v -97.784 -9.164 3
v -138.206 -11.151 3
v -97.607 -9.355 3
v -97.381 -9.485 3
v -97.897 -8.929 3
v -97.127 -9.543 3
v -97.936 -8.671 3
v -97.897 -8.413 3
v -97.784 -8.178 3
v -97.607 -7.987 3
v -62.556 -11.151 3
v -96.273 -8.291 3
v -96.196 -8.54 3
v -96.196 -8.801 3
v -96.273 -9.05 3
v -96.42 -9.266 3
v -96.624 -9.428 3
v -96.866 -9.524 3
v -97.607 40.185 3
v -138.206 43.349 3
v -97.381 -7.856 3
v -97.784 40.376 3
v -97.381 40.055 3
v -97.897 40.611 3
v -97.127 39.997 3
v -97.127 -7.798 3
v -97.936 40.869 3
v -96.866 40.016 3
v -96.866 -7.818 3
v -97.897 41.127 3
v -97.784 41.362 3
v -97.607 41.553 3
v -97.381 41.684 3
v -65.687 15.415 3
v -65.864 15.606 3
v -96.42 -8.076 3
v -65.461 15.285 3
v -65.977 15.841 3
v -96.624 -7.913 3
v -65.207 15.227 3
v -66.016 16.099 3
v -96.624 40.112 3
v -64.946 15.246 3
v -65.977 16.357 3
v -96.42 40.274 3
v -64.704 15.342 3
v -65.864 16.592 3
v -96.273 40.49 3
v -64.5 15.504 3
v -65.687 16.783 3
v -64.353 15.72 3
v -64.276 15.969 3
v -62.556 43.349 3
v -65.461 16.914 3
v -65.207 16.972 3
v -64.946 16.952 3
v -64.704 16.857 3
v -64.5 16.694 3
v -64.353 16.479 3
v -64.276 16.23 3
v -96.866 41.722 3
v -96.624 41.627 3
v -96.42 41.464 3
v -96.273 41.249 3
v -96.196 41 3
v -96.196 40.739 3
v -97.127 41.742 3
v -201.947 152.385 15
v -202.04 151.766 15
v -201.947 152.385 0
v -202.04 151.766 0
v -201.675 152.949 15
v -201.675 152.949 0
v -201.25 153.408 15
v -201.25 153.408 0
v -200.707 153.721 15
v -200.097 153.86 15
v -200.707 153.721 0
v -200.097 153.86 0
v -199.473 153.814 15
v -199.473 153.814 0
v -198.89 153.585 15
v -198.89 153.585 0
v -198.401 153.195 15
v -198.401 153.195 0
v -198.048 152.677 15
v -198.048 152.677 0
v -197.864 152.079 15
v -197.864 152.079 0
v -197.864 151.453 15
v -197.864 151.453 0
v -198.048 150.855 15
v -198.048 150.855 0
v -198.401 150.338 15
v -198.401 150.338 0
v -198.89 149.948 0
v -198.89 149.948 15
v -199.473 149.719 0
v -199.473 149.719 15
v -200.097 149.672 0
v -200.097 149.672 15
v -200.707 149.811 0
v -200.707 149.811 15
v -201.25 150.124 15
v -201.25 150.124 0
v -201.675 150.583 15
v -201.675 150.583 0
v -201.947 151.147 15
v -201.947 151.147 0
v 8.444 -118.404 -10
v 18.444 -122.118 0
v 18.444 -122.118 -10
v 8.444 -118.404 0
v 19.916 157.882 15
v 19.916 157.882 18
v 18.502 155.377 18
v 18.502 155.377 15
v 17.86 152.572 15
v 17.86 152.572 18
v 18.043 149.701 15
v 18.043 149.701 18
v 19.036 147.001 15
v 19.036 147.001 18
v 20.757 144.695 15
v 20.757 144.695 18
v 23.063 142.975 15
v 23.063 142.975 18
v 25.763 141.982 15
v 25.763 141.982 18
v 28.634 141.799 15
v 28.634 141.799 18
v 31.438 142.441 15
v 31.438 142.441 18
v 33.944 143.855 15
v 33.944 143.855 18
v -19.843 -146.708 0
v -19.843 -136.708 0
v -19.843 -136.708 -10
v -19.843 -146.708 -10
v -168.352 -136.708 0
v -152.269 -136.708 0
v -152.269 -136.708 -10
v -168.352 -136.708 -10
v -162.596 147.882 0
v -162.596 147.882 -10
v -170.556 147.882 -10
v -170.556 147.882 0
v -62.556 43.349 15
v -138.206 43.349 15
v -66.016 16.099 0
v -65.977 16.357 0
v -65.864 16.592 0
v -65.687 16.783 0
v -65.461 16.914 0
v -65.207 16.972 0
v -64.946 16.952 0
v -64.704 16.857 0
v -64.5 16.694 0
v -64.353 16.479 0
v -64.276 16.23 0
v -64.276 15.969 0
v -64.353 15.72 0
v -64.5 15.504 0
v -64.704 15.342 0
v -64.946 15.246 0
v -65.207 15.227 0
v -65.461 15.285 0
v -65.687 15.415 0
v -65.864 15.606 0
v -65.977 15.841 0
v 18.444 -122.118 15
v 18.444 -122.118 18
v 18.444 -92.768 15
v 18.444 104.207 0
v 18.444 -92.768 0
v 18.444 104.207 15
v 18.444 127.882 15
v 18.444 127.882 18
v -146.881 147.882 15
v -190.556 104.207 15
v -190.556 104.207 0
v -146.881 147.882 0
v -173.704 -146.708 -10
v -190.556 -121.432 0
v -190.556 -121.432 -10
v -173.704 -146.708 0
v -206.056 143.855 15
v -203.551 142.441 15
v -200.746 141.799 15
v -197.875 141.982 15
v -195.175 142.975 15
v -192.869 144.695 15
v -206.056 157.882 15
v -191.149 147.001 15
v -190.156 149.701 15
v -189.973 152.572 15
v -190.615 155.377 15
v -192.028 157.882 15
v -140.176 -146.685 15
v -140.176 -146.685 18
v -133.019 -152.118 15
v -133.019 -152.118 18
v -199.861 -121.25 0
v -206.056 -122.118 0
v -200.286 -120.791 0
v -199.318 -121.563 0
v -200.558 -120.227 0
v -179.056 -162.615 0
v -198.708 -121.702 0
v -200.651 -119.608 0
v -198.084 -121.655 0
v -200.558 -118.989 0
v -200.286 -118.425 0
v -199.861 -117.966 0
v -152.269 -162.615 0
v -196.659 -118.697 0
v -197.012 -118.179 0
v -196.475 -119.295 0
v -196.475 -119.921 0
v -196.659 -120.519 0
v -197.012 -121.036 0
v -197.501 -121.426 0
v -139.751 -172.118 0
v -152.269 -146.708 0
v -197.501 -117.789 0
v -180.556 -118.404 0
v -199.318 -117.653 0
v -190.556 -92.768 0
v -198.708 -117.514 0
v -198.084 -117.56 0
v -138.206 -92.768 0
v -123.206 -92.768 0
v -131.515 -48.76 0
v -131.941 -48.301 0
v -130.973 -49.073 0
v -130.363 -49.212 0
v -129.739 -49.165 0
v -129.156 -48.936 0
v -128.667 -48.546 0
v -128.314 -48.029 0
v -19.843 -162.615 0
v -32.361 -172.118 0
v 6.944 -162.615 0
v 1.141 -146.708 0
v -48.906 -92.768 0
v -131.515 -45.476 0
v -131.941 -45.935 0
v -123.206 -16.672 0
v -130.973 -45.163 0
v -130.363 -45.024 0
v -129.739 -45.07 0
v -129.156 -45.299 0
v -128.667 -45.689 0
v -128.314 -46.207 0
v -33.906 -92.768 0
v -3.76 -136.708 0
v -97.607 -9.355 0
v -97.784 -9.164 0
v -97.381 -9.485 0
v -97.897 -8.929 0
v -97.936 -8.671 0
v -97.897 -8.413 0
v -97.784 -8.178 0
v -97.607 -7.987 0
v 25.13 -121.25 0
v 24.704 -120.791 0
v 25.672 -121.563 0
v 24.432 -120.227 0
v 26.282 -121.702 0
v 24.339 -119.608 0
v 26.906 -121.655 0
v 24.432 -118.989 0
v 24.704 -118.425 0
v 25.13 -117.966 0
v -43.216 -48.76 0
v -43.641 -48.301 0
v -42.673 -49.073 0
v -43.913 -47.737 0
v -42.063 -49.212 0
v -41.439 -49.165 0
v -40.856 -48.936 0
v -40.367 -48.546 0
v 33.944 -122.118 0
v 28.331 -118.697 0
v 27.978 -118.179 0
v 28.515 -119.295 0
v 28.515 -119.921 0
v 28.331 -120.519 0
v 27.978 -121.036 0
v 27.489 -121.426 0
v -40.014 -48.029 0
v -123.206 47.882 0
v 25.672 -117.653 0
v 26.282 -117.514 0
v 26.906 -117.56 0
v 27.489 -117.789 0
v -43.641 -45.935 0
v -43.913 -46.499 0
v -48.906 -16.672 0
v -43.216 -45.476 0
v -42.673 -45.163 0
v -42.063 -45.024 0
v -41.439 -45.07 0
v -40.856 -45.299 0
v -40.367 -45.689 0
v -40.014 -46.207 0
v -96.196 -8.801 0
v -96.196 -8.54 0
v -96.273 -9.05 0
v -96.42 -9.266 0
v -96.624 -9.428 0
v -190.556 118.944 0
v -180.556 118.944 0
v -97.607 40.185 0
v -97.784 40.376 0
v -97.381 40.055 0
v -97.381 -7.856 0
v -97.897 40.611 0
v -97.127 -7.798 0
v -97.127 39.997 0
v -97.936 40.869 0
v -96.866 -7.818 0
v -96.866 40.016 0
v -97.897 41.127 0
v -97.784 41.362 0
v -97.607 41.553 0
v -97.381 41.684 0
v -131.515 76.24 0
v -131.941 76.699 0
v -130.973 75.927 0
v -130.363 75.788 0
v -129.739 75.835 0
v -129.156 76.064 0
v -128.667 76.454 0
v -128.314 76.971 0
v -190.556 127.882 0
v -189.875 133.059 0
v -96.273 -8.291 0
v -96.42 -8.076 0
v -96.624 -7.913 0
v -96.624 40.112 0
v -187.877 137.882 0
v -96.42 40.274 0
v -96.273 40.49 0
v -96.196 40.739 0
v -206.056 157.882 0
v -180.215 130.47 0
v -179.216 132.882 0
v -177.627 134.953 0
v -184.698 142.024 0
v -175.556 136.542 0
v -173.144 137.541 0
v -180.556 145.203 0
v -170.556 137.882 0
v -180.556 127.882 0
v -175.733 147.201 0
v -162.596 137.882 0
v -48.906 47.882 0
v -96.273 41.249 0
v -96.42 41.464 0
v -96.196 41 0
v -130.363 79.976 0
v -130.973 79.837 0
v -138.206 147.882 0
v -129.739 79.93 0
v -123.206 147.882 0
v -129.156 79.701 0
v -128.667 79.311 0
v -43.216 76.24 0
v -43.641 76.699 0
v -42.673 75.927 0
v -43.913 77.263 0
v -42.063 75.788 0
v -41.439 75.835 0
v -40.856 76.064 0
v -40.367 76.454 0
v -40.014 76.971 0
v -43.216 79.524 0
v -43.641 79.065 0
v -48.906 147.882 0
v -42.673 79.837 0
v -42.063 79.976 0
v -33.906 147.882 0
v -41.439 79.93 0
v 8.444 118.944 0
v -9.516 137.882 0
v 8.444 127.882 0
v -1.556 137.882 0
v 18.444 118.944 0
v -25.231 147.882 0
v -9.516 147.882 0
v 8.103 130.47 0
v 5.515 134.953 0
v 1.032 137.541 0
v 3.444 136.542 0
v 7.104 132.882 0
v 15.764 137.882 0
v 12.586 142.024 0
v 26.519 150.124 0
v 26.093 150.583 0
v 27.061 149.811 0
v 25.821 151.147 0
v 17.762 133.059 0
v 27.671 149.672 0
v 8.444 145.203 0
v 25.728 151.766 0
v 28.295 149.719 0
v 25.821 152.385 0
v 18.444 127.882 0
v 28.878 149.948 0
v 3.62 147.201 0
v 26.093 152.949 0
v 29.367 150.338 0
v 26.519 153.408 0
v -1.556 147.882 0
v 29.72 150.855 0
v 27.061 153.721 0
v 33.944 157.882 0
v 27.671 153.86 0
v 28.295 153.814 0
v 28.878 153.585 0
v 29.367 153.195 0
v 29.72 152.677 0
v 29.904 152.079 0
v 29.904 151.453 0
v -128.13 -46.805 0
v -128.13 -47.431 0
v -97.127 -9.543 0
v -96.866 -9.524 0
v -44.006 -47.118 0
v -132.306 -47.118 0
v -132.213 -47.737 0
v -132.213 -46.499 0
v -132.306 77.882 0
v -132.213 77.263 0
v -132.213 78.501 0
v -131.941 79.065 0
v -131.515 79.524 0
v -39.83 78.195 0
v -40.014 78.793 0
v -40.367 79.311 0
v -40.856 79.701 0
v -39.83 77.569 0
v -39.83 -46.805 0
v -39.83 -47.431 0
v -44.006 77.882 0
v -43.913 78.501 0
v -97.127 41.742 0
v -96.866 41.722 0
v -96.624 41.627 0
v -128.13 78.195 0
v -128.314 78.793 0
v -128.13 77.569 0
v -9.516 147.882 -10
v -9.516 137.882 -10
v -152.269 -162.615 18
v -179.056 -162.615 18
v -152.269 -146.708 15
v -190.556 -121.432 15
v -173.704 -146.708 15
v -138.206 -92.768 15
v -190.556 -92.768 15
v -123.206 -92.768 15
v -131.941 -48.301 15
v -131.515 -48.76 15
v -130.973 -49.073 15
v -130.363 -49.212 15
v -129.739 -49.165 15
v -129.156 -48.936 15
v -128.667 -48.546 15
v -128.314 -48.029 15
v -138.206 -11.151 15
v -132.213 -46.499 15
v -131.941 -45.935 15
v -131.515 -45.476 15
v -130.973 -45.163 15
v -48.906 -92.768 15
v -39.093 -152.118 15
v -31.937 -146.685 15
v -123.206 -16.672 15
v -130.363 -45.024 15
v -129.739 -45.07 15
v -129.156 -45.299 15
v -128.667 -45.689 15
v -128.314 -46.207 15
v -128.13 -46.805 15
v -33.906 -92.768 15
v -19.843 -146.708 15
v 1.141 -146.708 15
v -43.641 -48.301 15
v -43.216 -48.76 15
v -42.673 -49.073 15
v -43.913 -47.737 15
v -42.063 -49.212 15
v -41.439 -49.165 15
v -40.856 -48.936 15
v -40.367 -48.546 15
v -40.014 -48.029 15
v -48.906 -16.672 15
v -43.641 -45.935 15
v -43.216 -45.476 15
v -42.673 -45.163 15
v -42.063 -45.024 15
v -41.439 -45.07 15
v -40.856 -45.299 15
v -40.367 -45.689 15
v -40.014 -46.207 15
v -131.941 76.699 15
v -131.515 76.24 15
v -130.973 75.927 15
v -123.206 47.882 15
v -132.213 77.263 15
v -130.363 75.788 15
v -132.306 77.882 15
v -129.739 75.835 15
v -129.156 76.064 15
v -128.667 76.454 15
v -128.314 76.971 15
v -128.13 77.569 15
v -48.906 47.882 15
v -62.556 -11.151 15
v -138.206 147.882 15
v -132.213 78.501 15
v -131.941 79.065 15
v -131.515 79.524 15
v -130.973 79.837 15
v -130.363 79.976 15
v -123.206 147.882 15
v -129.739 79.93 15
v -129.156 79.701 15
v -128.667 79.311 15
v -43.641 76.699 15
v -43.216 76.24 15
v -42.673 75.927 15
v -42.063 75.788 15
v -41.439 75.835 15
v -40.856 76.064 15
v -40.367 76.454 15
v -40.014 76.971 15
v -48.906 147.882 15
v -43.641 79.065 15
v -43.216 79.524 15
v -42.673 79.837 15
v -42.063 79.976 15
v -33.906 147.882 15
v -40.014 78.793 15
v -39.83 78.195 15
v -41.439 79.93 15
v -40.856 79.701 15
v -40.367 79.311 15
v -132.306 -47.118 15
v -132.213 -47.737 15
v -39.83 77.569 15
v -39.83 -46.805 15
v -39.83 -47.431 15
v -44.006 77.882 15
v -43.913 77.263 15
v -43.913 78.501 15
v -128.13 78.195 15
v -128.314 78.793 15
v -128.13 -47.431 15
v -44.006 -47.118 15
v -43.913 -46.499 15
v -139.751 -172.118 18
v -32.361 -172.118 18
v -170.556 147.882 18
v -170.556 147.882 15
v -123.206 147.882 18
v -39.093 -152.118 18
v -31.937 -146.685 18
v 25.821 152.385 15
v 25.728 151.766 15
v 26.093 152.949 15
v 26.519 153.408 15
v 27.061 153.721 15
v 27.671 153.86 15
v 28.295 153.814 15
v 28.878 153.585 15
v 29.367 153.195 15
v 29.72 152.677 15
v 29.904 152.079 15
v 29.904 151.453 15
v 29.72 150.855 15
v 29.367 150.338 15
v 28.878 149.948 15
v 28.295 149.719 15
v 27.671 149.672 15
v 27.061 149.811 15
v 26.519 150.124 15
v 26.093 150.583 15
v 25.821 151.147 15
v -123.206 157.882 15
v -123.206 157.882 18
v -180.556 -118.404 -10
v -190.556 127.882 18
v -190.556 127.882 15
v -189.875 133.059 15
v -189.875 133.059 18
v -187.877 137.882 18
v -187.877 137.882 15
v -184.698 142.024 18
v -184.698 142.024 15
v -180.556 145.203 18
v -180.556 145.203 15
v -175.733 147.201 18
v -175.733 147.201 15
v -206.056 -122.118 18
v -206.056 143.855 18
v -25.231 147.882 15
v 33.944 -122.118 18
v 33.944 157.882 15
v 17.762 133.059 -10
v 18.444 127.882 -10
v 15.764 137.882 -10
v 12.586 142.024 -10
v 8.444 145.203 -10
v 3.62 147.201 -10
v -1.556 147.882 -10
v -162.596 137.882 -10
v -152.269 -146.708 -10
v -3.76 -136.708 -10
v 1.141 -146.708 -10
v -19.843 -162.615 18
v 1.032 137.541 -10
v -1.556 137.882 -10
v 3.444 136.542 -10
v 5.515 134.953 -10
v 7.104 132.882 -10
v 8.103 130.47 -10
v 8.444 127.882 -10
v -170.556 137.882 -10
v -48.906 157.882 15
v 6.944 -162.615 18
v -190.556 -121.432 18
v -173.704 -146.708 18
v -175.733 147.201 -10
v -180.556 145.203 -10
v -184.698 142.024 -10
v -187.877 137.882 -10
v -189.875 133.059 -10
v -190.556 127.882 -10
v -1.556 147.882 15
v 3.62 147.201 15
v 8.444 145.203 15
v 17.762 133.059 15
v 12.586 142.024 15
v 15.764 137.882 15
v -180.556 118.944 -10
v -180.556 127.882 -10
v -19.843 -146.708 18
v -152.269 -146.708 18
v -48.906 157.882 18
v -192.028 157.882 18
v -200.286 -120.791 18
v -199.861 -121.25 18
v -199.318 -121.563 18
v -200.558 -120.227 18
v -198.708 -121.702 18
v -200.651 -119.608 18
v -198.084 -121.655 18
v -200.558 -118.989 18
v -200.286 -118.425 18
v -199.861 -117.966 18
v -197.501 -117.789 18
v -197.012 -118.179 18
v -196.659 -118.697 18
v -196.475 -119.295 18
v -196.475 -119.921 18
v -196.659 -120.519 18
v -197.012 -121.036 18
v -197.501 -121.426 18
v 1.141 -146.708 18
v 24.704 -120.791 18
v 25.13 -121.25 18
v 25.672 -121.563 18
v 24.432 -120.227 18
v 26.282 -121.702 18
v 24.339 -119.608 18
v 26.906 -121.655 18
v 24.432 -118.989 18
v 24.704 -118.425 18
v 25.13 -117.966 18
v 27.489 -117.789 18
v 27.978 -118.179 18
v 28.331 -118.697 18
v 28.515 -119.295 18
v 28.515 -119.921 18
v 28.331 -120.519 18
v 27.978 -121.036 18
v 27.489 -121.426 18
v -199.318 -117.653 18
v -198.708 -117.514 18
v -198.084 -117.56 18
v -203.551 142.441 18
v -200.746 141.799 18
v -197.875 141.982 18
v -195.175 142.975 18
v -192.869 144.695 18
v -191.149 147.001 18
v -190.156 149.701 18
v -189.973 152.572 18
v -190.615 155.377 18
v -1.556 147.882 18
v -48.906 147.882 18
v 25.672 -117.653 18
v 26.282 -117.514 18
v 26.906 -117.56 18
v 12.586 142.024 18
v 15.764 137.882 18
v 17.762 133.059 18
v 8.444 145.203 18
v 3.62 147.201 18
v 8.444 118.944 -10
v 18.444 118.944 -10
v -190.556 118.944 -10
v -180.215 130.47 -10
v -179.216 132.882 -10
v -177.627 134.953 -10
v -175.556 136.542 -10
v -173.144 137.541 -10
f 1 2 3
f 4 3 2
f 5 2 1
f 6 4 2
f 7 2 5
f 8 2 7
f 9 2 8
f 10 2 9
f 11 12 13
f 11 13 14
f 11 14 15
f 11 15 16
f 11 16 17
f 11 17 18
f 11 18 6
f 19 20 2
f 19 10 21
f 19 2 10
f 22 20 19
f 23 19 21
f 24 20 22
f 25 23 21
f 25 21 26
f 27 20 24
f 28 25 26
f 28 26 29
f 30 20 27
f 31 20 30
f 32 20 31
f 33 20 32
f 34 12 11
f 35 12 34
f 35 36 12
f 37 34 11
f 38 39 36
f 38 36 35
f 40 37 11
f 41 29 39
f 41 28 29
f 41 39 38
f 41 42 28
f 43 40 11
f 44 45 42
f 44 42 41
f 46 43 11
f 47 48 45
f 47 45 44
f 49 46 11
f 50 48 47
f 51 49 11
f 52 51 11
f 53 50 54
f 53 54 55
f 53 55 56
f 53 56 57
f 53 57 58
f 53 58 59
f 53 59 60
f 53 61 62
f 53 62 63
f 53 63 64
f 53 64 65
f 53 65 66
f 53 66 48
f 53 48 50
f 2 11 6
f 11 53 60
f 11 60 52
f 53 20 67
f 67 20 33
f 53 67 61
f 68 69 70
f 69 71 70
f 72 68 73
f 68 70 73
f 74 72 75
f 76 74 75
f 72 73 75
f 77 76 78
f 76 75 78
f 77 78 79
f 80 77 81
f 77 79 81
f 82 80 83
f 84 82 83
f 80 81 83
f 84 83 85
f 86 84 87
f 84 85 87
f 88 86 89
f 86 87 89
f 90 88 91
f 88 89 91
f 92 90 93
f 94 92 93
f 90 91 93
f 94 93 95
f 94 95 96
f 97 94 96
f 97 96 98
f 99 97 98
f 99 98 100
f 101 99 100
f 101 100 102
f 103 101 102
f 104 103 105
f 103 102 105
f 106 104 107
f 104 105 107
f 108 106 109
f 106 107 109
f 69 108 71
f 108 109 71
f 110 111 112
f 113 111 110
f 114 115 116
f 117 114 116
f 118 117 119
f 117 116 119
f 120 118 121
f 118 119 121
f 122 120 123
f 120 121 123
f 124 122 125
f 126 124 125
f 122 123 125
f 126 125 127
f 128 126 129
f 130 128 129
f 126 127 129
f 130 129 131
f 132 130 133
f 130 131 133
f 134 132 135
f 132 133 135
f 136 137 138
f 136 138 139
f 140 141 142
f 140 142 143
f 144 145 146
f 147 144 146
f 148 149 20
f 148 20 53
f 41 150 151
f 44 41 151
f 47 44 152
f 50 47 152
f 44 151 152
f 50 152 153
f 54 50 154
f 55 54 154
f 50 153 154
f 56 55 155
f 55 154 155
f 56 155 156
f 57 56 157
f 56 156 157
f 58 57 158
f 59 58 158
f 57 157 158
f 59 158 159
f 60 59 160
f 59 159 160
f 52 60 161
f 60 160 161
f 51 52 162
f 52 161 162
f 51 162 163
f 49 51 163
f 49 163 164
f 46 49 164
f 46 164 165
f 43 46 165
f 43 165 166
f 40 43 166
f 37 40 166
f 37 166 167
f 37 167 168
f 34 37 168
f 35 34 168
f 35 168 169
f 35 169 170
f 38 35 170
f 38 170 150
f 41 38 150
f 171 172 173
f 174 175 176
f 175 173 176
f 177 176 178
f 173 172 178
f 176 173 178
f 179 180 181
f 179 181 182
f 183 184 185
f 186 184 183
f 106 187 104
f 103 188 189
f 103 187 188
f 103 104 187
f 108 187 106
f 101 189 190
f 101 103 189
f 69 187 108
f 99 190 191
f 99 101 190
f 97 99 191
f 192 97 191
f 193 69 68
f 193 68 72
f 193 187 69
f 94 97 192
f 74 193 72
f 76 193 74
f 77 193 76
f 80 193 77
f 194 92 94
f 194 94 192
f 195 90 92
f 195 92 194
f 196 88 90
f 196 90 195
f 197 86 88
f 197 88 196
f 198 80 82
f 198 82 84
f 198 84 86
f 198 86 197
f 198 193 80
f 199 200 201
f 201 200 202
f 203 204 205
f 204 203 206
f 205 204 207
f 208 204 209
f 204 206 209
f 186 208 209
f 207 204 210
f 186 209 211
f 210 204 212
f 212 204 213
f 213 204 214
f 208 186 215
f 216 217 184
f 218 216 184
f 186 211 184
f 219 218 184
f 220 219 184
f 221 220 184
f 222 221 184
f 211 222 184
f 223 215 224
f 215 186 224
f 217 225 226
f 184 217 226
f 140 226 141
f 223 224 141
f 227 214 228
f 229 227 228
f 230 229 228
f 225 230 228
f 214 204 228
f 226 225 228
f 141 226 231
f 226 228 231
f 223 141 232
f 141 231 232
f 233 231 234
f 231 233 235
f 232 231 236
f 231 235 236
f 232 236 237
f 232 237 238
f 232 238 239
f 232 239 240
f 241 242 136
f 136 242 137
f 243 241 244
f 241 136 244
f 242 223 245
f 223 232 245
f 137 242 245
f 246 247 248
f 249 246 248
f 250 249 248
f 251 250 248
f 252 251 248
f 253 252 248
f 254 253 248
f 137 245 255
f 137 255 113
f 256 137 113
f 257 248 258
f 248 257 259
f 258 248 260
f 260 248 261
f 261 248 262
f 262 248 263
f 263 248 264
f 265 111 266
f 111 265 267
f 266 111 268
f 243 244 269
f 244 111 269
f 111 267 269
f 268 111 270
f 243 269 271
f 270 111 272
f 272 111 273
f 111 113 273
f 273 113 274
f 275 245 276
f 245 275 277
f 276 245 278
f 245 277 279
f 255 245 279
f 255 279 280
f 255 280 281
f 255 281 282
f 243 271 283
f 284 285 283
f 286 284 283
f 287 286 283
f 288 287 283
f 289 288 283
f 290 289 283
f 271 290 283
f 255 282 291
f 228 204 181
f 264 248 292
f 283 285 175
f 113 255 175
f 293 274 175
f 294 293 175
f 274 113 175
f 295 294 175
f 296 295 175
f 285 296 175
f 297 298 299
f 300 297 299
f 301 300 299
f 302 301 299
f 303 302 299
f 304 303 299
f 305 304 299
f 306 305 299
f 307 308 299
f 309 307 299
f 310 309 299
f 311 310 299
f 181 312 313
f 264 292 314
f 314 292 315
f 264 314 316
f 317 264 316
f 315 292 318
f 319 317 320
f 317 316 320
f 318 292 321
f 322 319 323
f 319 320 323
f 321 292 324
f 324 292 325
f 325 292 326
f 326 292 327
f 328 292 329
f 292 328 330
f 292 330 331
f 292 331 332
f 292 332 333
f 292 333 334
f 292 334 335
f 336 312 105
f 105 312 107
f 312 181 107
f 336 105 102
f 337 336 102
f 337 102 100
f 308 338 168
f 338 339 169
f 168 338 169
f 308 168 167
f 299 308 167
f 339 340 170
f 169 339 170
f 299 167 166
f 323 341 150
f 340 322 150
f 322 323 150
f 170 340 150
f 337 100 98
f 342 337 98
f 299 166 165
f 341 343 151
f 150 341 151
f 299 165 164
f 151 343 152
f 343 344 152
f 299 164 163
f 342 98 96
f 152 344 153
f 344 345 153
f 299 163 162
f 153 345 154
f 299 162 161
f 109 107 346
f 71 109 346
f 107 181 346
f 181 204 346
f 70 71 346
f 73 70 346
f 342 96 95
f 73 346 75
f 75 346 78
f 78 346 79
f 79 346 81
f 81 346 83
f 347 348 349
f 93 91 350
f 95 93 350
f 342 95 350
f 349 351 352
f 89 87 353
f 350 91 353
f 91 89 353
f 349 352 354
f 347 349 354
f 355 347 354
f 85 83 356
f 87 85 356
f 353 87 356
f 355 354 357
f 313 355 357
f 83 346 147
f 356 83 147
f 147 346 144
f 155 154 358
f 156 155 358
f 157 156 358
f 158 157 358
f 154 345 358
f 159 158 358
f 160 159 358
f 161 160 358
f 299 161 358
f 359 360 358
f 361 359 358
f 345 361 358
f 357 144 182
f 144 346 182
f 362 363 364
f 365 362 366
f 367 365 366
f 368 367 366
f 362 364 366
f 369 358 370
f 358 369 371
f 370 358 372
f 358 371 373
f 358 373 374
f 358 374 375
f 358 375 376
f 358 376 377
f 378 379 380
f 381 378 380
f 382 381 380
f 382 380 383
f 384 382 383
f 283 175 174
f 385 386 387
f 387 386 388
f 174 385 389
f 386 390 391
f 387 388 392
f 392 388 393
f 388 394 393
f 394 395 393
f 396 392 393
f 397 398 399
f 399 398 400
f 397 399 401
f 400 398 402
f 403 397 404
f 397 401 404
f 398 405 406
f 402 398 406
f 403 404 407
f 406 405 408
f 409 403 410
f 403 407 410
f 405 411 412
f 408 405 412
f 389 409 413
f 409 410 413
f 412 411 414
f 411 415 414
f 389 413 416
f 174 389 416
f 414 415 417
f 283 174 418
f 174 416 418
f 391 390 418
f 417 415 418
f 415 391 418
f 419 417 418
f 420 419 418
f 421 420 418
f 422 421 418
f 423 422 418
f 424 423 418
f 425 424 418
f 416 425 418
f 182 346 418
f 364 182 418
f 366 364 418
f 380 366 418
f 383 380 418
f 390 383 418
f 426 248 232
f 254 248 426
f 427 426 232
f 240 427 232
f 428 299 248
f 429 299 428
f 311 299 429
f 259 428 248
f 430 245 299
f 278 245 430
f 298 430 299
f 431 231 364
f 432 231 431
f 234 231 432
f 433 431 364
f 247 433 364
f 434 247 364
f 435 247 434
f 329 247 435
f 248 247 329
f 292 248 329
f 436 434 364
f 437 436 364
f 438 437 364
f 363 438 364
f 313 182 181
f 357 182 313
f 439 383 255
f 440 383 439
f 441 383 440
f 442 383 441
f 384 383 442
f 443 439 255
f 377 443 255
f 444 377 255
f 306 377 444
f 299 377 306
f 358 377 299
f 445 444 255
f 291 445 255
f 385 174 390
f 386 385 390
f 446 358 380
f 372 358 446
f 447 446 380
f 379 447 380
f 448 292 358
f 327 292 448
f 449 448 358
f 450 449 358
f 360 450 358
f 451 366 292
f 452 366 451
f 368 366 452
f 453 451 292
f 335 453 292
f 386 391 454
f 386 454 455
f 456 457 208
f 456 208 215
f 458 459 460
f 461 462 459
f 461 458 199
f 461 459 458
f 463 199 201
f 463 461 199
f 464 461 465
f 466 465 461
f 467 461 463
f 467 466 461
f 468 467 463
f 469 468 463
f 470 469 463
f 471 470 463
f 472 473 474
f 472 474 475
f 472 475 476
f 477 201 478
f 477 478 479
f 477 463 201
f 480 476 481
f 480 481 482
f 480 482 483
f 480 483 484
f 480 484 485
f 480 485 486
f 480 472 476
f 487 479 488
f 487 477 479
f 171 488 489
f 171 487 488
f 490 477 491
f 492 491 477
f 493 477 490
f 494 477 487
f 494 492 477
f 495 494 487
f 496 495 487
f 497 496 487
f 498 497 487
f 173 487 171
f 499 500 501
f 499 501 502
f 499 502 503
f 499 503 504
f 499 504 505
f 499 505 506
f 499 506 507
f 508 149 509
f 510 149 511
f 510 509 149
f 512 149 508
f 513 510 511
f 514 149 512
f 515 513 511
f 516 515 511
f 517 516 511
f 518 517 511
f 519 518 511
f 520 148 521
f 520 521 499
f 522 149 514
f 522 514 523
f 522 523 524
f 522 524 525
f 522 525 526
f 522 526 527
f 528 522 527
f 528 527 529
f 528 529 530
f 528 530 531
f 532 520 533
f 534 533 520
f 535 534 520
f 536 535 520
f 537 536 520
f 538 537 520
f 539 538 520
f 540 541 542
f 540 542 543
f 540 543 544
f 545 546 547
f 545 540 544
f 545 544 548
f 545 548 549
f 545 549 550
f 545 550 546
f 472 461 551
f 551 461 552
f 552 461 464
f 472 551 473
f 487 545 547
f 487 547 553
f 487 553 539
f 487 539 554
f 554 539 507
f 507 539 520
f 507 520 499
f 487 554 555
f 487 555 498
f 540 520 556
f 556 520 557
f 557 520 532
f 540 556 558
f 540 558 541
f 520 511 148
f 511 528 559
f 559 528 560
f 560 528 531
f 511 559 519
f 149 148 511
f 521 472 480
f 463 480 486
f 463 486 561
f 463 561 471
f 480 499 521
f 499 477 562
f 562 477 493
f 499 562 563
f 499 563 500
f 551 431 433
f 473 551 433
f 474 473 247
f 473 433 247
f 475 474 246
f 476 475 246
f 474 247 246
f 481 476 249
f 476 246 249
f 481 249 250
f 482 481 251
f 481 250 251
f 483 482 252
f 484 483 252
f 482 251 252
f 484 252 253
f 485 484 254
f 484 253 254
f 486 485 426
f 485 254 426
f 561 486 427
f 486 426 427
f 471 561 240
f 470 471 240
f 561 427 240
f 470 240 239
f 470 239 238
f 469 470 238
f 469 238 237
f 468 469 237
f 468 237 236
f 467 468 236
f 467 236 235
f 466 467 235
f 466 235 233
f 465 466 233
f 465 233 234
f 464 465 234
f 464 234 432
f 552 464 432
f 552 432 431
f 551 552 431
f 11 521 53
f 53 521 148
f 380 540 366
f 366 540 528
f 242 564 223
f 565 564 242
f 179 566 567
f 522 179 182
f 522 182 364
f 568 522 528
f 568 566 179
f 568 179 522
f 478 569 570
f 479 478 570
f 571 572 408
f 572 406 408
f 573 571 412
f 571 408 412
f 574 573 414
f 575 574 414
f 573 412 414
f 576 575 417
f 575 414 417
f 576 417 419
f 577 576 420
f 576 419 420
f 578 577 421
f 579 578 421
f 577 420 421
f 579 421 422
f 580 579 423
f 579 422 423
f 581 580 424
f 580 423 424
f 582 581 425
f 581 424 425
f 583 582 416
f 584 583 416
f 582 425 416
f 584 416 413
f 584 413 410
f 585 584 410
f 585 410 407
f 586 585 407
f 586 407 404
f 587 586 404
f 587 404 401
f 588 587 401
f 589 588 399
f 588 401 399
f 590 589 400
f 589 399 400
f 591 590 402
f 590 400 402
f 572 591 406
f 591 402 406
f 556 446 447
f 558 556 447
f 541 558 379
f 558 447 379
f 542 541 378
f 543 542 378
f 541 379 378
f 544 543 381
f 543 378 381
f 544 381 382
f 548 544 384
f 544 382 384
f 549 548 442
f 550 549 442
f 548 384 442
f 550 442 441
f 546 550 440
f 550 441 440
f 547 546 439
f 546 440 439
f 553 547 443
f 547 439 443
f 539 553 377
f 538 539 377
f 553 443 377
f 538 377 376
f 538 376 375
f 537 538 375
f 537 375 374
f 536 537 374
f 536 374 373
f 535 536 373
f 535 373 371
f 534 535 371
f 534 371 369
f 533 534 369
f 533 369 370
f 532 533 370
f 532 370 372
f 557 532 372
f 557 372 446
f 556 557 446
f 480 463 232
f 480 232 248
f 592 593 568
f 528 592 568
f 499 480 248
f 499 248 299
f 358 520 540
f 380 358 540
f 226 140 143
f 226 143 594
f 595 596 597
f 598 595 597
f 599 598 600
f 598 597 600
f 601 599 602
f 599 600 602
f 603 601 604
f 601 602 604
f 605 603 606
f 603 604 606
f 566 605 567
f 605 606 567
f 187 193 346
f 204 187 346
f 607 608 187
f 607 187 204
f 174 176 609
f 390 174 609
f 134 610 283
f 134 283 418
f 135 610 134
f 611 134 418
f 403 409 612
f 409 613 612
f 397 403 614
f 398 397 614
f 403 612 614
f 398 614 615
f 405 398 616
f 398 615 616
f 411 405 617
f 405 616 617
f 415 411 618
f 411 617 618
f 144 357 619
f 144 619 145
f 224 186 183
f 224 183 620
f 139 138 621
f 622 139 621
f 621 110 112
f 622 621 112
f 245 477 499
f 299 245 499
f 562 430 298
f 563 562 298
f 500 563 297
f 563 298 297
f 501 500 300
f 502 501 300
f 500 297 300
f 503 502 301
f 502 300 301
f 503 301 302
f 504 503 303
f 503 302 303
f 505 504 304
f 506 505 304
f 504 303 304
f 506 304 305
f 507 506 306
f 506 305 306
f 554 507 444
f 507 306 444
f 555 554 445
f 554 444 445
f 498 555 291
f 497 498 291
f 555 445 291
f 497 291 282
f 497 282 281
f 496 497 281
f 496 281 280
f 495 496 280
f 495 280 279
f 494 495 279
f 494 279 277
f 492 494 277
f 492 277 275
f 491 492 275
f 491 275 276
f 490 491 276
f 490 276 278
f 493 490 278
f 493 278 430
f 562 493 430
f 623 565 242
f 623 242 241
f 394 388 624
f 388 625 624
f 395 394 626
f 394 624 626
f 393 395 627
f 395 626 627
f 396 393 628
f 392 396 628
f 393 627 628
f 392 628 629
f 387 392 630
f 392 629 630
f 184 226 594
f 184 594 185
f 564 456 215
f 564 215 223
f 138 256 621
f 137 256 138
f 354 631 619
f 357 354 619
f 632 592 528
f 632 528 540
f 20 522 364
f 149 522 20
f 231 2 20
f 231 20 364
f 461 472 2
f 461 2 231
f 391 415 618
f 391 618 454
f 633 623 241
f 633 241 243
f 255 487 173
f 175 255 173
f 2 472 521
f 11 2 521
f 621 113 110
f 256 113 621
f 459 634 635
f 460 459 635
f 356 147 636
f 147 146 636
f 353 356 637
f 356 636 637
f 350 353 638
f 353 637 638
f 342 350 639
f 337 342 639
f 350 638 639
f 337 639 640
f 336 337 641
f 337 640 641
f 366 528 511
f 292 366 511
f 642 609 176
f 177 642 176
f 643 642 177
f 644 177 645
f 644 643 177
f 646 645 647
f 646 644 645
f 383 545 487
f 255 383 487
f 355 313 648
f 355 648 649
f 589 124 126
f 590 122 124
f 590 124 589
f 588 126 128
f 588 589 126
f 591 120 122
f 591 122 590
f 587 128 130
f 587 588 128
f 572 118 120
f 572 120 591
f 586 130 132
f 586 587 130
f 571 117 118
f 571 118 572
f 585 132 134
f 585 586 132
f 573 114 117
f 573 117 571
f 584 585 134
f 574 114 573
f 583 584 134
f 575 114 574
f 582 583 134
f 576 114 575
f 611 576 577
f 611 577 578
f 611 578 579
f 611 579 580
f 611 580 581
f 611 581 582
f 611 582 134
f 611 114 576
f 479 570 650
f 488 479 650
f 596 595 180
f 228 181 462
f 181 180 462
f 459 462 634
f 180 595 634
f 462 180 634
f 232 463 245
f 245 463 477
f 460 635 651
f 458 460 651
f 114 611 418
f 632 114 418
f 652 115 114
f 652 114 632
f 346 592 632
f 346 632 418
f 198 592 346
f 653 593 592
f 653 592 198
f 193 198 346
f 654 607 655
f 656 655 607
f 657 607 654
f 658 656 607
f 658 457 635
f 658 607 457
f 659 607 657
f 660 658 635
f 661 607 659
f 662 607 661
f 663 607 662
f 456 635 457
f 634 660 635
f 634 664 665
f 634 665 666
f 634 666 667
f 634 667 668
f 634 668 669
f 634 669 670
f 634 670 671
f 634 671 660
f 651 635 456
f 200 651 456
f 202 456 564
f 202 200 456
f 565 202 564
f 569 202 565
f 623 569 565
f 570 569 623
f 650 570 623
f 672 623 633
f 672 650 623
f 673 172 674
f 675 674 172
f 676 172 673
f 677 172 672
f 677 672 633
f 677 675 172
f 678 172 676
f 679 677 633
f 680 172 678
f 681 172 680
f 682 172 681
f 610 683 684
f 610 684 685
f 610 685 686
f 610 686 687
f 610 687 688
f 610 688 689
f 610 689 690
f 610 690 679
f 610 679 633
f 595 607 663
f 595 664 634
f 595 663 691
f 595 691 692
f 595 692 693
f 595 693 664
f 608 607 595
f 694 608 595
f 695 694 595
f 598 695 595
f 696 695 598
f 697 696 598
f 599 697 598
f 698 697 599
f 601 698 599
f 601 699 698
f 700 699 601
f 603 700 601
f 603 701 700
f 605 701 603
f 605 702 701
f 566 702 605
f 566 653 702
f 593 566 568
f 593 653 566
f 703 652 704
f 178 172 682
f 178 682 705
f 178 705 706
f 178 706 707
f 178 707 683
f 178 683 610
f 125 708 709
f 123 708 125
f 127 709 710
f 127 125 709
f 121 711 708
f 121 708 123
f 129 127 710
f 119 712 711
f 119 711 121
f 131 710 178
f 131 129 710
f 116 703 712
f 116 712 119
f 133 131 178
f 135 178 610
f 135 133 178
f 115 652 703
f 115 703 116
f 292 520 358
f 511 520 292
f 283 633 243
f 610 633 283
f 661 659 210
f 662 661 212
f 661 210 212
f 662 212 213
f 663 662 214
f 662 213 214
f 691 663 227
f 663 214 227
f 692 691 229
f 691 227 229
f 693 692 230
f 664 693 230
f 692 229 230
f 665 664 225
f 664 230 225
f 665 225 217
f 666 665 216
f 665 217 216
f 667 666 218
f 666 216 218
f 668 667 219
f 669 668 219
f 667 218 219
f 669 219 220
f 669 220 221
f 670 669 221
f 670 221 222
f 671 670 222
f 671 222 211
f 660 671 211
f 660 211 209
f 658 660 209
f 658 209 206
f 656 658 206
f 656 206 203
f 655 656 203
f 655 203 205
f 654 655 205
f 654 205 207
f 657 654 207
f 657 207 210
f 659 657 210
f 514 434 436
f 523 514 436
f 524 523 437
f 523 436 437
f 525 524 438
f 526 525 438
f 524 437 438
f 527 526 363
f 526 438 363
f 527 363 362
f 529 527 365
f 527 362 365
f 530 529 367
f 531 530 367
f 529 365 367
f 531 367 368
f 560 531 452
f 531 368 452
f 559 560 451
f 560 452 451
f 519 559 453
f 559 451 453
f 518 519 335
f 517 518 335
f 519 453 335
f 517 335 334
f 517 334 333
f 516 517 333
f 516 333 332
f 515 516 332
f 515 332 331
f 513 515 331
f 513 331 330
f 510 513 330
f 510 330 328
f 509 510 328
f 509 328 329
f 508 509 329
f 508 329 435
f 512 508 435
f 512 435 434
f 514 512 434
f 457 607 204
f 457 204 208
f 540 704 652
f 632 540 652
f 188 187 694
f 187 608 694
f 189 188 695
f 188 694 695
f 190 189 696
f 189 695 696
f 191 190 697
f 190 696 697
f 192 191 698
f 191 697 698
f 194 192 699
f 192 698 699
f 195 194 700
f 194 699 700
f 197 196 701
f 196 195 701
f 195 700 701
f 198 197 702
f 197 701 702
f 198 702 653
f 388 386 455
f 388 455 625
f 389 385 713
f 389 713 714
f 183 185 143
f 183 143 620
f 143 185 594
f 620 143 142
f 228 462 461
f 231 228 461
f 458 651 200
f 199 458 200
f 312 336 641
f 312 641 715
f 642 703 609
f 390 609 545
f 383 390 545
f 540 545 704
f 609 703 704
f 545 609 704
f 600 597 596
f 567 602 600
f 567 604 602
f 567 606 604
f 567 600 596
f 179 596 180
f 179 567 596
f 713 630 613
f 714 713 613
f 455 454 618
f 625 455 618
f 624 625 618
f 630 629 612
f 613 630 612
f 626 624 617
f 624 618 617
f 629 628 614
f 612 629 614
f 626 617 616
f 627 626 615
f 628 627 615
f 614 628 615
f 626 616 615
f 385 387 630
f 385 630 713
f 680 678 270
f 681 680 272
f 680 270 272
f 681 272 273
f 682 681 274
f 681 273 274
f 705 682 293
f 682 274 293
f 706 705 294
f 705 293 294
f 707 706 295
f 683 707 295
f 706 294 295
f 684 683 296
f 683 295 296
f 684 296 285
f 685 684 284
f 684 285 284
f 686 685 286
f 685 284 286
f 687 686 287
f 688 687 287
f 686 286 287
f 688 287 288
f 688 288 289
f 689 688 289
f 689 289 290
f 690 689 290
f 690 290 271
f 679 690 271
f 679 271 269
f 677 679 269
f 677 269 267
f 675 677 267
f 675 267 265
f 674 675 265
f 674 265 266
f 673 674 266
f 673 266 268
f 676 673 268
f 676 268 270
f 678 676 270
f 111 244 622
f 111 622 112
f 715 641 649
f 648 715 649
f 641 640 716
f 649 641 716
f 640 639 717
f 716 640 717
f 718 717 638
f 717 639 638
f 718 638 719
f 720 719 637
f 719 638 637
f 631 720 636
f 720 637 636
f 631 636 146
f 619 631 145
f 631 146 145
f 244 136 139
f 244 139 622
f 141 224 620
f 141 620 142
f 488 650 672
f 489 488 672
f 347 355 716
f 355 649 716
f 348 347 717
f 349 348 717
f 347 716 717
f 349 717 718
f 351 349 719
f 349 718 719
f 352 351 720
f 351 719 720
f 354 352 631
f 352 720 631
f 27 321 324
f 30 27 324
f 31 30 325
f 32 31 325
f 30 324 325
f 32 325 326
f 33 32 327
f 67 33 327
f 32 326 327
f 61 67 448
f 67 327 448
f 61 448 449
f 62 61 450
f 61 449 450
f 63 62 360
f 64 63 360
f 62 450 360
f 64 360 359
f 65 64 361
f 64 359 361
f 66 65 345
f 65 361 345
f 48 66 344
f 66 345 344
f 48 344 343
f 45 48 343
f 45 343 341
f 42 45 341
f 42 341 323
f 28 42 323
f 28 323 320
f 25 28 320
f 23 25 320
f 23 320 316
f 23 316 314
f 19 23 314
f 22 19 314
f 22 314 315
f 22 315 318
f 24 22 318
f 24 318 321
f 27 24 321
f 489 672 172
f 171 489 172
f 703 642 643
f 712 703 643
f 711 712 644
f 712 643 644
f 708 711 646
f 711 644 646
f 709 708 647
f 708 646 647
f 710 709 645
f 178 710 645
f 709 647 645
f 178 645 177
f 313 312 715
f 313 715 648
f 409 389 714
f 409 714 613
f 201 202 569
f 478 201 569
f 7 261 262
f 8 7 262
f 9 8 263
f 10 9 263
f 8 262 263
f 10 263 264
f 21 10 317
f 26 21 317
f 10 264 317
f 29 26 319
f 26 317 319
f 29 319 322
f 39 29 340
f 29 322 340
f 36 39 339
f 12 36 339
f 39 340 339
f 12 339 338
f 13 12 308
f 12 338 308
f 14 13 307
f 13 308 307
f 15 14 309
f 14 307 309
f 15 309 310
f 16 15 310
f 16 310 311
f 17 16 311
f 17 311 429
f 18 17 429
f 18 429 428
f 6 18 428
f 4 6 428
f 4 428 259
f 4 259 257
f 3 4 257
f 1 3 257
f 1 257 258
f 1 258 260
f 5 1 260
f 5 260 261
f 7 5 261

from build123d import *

# Parameters (mm, degrees)
BOSS_EXTRU_1_DEPTH                                = 30
ENL_V_MAT_EXTRU_1_DEPTH                           = 15
BOSS_EXTRU_2_DEPTH                                = 10
BOSS_EXTRU_3_DEPTH                                = 10
BOSS_EXTRU_4_DEPTH                                = 10
BOSS_EXTRU_5_DEPTH                                = 10
DIAM_TRE_DU_PER_AGE_4_2_4_2_1_D                   = 4.2
DIAM_TRE_DU_PER_AGE_4_2_4_2_1_DEPTH               = 40
CHAMBRAGE_POUR_VIS_T_TE_HEXAGONALE_M3_D           = 4.2
CHAMBRAGE_POUR_VIS_T_TE_HEXAGONALE_M3_DEPTH       = 40
CHAMBRAGE_POUR_VIS_T_TE_HEXAGONALE_M3_CBORE_D     = 20
CHAMBRAGE_POUR_VIS_T_TE_HEXAGONALE_M3_CBORE_DEPTH = 15
CONG_1_R                                          = 10
CONG_2_R                                          = 20
ENL_V_MAT_EXTRU_2_DEPTH                           = 270.645454496
TROU_TARAUD_M5X0_81_D                             = 4.2
TROU_TARAUD_M5X0_81_ON_FACE_2_D                   = 4.2
BOSS_EXTRU_6_DEPTH                                = 15
ESQUISSE14_W                                      = 344.623968027
ESQUISSE14_H                                      = 364.856294917
ENL_V_MAT_EXTRU_3_DEPTH                           = 12
BOSS_EXTRU_7_DEPTH                                = 15
ESQUISSE16_W                                      = 47
ESQUISSE16_H                                      = 54.5
ENL_V_MAT_EXTRU_4_DEPTH                           = 12
ESQUISSE17_R                                      = 0.5
ENL_V_MAT_EXTRU_5_DEPTH                           = 12
TROU_TARAUD_M2_2X0_451_D                          = 1.75
ENL_V_MAT_EXTRU_6_DEPTH                           = 270.645454496
BOSS_EXTRU_8_DEPTH                                = 15
ESQUISSE21_W                                      = 34.017882368
ESQUISSE21_H                                      = 54.5
ENL_V_MAT_EXTRU_7_DEPTH                           = 12
TROU_TARAUD_M5X0_82_D                             = 4.2
TROU_TARAUD_M5X0_82_DEPTH                         = 54.927
TROU_TARAUD_M5X0_82_TIP                           = 1.2618073
TROU_TARAUD_M5X0_84_D                             = 4.2
TROU_TARAUD_M5X0_84_DEPTH                         = 54.927
TROU_TARAUD_M5X0_84_TIP                           = 1.2618073


with BuildPart() as part:
    # Esquisse1 → Boss.-Extru.1 (new body)
    with BuildSketch(Plane.XY.offset(30)):
        Polygon((33.943844834, -122.117785393), (33.943844834, 157.882214607), (-206.056155166, 157.882214607), (-206.056155166, -122.117785393), (-179.056155166, -162.614832092), (-152.268878217, -162.614832092), (-139.750990012, -172.117785393), (-32.361320321, -172.117785393), (-19.843432116, -162.614832092), (6.943844834, -162.614832092), align=None)
    extrude(amount=-BOSS_EXTRU_1_DEPTH)

    # Esquisse2 → Enlèv. mat.-Extru.1 (cut)
    with BuildSketch(Plane.XY.offset(30)):
        Polygon((-123.206083599, 157.882214607), (-123.206083599, 147.882214607), (-190.556155166, 147.882214607), (-190.556155166, -121.431981452), (-173.70399548, -146.708377667), (-152.268878217, -146.708377667), (-140.175798707, -146.685066621), (-133.019479604, -152.117785393), (-39.092830728, -152.117785393), (-31.936511626, -146.685066621), (-19.843432116, -146.708377667), (1.141061448, -146.708377667), (18.443844834, -122.117785393), (18.443844834, 147.882214607), (-48.906226734, 147.882214607), (-48.906226734, 157.882214607), align=None)
    extrude(amount=-ENL_V_MAT_EXTRU_1_DEPTH, mode=Mode.SUBTRACT)

    # Esquisse3 → Boss.-Extru.2 (add)
    with BuildSketch(Plane(origin=(0, 0, 0), x_dir=(-1, 0, 0), z_dir=(0, 0, -1))):
        Polygon((162.596079372, 137.882214607), (162.596079372, 147.882214607), (190.556155166, 147.882214607), (190.556155166, 118.944465923), (180.556155166, 118.944465923), (180.556155166, 137.882214607), align=None)
    extrude(amount=BOSS_EXTRU_2_DEPTH)

    # Esquisse4 → Boss.-Extru.3 (add)
    with BuildSketch(Plane(origin=(0, 0, 0), x_dir=(-1, 0, 0), z_dir=(0, 0, -1))):
        Polygon((152.268878217, -136.708377667), (168.352374382, -136.708377667), (180.556155166, -118.404041358), (190.556155166, -121.431981452), (173.70399548, -146.708377667), (152.268878217, -146.708377667), align=None)
    extrude(amount=BOSS_EXTRU_3_DEPTH)

    # Esquisse5 → Boss.-Extru.4 (add)
    with BuildSketch(Plane(origin=(0, 0, 0), x_dir=(-1, 0, 0), z_dir=(0, 0, -1))):
        Polygon((-8.443844834, 137.882214607), (-8.443844834, 118.944465923), (-18.443844834, 118.944465923), (-18.443844834, 147.882214607), (9.516230961, 147.882214607), (9.516230961, 137.882214607), align=None)
    extrude(amount=BOSS_EXTRU_4_DEPTH)

    # Esquisse6 → Boss.-Extru.5 (add)
    with BuildSketch(Plane(origin=(0, 0, 0), x_dir=(-1, 0, 0), z_dir=(0, 0, -1))):
        Polygon((3.759935951, -136.708377667), (19.843432116, -136.708377667), (19.843432116, -146.708377667), (-1.141061448, -146.708377667), (-18.443844834, -122.117785393), (-8.443844834, -118.404041358), align=None)
    extrude(amount=BOSS_EXTRU_5_DEPTH)

    # Diamètre du perçage Ø4.2 (4.2)1
    with Locations(Plane.XY.offset(30)):
        with Locations((26.438895769, -119.607785393), (-198.551206101, -119.607785393)):
            Hole(DIAM_TRE_DU_PER_AGE_4_2_4_2_1_D / 2, depth=DIAM_TRE_DU_PER_AGE_4_2_4_2_1_DEPTH)

    # Chambrage pour vis à tête hexagonale M3.51
    with Locations(Plane.XY.offset(30)):
        with Locations((-199.94021721, 151.76627665), (27.827906877, 151.76627665)):
            CounterBoreHole(CHAMBRAGE_POUR_VIS_T_TE_HEXAGONALE_M3_D / 2, CHAMBRAGE_POUR_VIS_T_TE_HEXAGONALE_M3_CBORE_D / 2, CHAMBRAGE_POUR_VIS_T_TE_HEXAGONALE_M3_CBORE_DEPTH, depth=CHAMBRAGE_POUR_VIS_T_TE_HEXAGONALE_M3_DEPTH)

    # Congé1
    cong_1_edges = [part.edges().sort_by_distance(p)[0] for p in [
        (8.443844834, 137.882214607, -5),
        (-180.556155166, 137.882214607, -5),
    ]]
    fillet(cong_1_edges, radius=CONG_1_R)

    # Congé2
    cong_2_edges = [part.edges().sort_by_distance(p)[0] for p in [
        (18.443844834, 147.882214607, -5),
        (18.443844834, 147.882214607, 22.5),
        (-190.556155166, 147.882214607, 22.5),
        (-190.556155166, 147.882214607, -5),
    ]]
    fillet(cong_2_edges, radius=CONG_2_R)

    # Esquisse11 → Enlèv. mat.-Extru.2 (cut, through all)
    with BuildSketch(Plane.XY.offset(15)):
        Polygon((-123.206083599, 147.882214607), (-123.206083599, 47.882214607), (-190.556155166, -22.43592162), (-190.556155166, -92.767969228), (18.443844834, -92.767969228), (18.443844834, -22.43592162), (-48.906226734, 47.882214607), (-48.906226734, 147.882214607), align=None)
        Polygon((-138.206083599, 147.882214607), (-138.206083599, 57.882214607), (-190.556155166, 3.225116578), (-190.556155166, 95.532143039), (-190.556155166, 104.207178823), (-146.881119383, 147.882214607), align=None)
        Polygon((-33.906226734, 57.882214607), (18.443844834, 3.225116578), (18.443844834, 95.532143039), (18.443844834, 104.207178823), (-25.23119095, 147.882214607), (-33.906226734, 147.882214607), align=None)
    extrude(amount=-ENL_V_MAT_EXTRU_2_DEPTH, mode=Mode.SUBTRACT)

    # Trou taraudé M5x0.81 (through all)
    with Locations(Plane(origin=(-199.94021721, 151.76627665, 15), x_dir=(1, 0, 0), z_dir=(0, 0, 1))):
        with Locations((0, 0), (227.768124087, 0)):
            Hole(TROU_TARAUD_M5X0_81_D / 2)

    # Trou taraudé M5x0.81 on face 2 (through all)
    with Locations(Plane(origin=(26.438895769, -119.607785393, 30), x_dir=(1, 0, 0), z_dir=(0, 0, 1))):
        with Locations((0, 0), (-224.99010187, 0)):
            Hole(TROU_TARAUD_M5X0_81_ON_FACE_2_D / 2)

    # Esquisse13 → Boss.-Extru.6 (add)
    with BuildSketch(Plane.XY.offset(15)):
        Polygon((-48.906226734, 47.882214607), (-123.206083599, 47.882214607), (-148.90605105, 21.049669812), (-190.556155166, -22.43592162), (-190.556155166, -49.268466414), (-123.206083599, 21.049669812), (-48.906226734, 21.049669812), (18.443844834, -49.268466414), (18.443844834, -22.43592162), (-23.206259282, 21.049669812), align=None)
    extrude(amount=-BOSS_EXTRU_6_DEPTH)

    # Esquisse14 → Enlèv. mat.-Extru.3 (cut)
    with BuildSketch(Plane.XY.offset(30)):
        with Locations((-76.951608065, -8.129401738)):
            Rectangle(ESQUISSE14_W, ESQUISSE14_H)
    extrude(amount=-ENL_V_MAT_EXTRU_3_DEPTH, mode=Mode.SUBTRACT)

    # Esquisse15 → Boss.-Extru.7 (add)
    with BuildSketch(Plane.XY.offset(15)):
        Polygon((-165.240705537, 11.949496673), (-165.240705537, -16.671939758), (-10.373483375, -16.671939758), (-10.373483375, 17.080639576), (-29.498652377, 36.205808578), (-140.984393632, 36.205808578), align=None)
    extrude(amount=-BOSS_EXTRU_7_DEPTH)

    # Esquisse16 → Enlèv. mat.-Extru.4 (cut)
    with BuildSketch(Plane.XY.offset(15)):
        with Locations((-86.056155166, 16.099315521)):
            Rectangle(ESQUISSE16_W, ESQUISSE16_H)
    extrude(amount=-ENL_V_MAT_EXTRU_4_DEPTH, mode=Mode.SUBTRACT)

    # Esquisse17 → Enlèv. mat.-Extru.5 (cut)
    with BuildSketch(Plane.XY.offset(3)):
        with Locations((-97.061155166, 40.869315521)):
            Circle(ESQUISSE17_R)
        with Locations((-65.141155166, 16.099315521)):
            Circle(ESQUISSE17_R)
        with Locations((-97.061155166, -8.670684479)):
            Circle(ESQUISSE17_R)
    extrude(amount=-ENL_V_MAT_EXTRU_5_DEPTH, mode=Mode.SUBTRACT)

    # Trou taraudé M2.2x0.451 (through all)
    with Locations(Plane(origin=(-97.061155166, 40.869315521, 3), x_dir=(1, 0, 0), z_dir=(0, 0, 1))):
        with Locations((0, 0), (31.92, -24.77), (0, -49.54)):
            Hole(TROU_TARAUD_M2_2X0_451_D / 2)

    # Esquisse19 → Enlèv. mat.-Extru.6 (cut, through all)
    with BuildSketch(Plane.XY.offset(15)):
        Polygon((-138.206083599, -92.767969228), (-138.206083599, -16.671939758), (-159.335498292, -16.671939758), (-190.556155166, -49.268466414), (-190.556155166, -92.767969228), align=None)
        Polygon((-190.556155166, 3.225116578), (-138.206083599, 57.882214607), (-190.556155166, 57.882214607), align=None)
        Polygon((-138.206083599, -16.671939758), (-138.206083599, 57.882214607), (-190.556155166, 3.225116578), (-190.556155166, -49.268466414), (-159.335498292, -16.671939758), align=None)
        Polygon((18.443844834, 57.882214607), (-33.906226734, 57.882214607), (18.443844834, 3.225116578), align=None)
        Polygon((-33.906226734, 57.882214607), (-33.906226734, -16.671939758), (-12.77681204, -16.671939758), (18.443844834, -49.268466414), (18.443844834, 3.225116578), align=None)
        Polygon((-12.77681204, -16.671939758), (-33.906226734, -16.671939758), (-33.906226734, -92.767969228), (18.443844834, -92.767969228), (18.443844834, -49.268466414), align=None)
    extrude(amount=-ENL_V_MAT_EXTRU_6_DEPTH, mode=Mode.SUBTRACT)

    # Esquisse20 → Boss.-Extru.8 (add)
    with BuildSketch(Plane.XY.offset(15)):
        Polygon((-138.206083599, -16.671939758), (-138.206083599, -97.039238238), (-123.206083599, -97.039238238), (-123.206083599, 49.892057072), (-138.206083599, 49.892057072), align=None)
        Polygon((-48.906226734, 49.892057072), (-33.906226734, 49.892057072), (-33.906226734, -16.671939758), (-33.906226734, -97.039238238), (-48.906226734, -97.039238238), align=None)
    extrude(amount=-BOSS_EXTRU_8_DEPTH)

    # Esquisse21 → Enlèv. mat.-Extru.7 (cut)
    with BuildSketch(Plane.XY.offset(15)):
        with Locations((-126.56509635, 16.099315521)):
            Rectangle(ESQUISSE21_W, ESQUISSE21_H)
    extrude(amount=-ENL_V_MAT_EXTRU_7_DEPTH, mode=Mode.SUBTRACT)

    # Trou taraudé M5x0.82
    with Locations(Plane(origin=(-130.206083599, 77.882214607, 15), x_dir=(1, 0, 0), z_dir=(0, 0, 1))):
        with Locations((0, 0), (88.299856865, 0)):
            Hole(TROU_TARAUD_M5X0_82_D / 2, depth=TROU_TARAUD_M5X0_82_DEPTH)
            with Locations((0, 0, -(TROU_TARAUD_M5X0_82_DEPTH + TROU_TARAUD_M5X0_82_TIP / 2))):  # 118° drill point
                Cone(0, TROU_TARAUD_M5X0_82_D / 2, TROU_TARAUD_M5X0_82_TIP, mode=Mode.SUBTRACT)

    # Trou taraudé M5x0.84
    with Locations(Plane(origin=(-130.206083599, -47.117785393, 15), x_dir=(1, 0, 0), z_dir=(0, 0, 1))):
        with Locations((0, 0), (88.299856865, 0)):
            Hole(TROU_TARAUD_M5X0_84_D / 2, depth=TROU_TARAUD_M5X0_84_DEPTH)
            with Locations((0, 0, -(TROU_TARAUD_M5X0_84_DEPTH + TROU_TARAUD_M5X0_84_TIP / 2))):  # 118° drill point
                Cone(0, TROU_TARAUD_M5X0_84_D / 2, TROU_TARAUD_M5X0_84_TIP, mode=Mode.SUBTRACT)


solid = part.part
